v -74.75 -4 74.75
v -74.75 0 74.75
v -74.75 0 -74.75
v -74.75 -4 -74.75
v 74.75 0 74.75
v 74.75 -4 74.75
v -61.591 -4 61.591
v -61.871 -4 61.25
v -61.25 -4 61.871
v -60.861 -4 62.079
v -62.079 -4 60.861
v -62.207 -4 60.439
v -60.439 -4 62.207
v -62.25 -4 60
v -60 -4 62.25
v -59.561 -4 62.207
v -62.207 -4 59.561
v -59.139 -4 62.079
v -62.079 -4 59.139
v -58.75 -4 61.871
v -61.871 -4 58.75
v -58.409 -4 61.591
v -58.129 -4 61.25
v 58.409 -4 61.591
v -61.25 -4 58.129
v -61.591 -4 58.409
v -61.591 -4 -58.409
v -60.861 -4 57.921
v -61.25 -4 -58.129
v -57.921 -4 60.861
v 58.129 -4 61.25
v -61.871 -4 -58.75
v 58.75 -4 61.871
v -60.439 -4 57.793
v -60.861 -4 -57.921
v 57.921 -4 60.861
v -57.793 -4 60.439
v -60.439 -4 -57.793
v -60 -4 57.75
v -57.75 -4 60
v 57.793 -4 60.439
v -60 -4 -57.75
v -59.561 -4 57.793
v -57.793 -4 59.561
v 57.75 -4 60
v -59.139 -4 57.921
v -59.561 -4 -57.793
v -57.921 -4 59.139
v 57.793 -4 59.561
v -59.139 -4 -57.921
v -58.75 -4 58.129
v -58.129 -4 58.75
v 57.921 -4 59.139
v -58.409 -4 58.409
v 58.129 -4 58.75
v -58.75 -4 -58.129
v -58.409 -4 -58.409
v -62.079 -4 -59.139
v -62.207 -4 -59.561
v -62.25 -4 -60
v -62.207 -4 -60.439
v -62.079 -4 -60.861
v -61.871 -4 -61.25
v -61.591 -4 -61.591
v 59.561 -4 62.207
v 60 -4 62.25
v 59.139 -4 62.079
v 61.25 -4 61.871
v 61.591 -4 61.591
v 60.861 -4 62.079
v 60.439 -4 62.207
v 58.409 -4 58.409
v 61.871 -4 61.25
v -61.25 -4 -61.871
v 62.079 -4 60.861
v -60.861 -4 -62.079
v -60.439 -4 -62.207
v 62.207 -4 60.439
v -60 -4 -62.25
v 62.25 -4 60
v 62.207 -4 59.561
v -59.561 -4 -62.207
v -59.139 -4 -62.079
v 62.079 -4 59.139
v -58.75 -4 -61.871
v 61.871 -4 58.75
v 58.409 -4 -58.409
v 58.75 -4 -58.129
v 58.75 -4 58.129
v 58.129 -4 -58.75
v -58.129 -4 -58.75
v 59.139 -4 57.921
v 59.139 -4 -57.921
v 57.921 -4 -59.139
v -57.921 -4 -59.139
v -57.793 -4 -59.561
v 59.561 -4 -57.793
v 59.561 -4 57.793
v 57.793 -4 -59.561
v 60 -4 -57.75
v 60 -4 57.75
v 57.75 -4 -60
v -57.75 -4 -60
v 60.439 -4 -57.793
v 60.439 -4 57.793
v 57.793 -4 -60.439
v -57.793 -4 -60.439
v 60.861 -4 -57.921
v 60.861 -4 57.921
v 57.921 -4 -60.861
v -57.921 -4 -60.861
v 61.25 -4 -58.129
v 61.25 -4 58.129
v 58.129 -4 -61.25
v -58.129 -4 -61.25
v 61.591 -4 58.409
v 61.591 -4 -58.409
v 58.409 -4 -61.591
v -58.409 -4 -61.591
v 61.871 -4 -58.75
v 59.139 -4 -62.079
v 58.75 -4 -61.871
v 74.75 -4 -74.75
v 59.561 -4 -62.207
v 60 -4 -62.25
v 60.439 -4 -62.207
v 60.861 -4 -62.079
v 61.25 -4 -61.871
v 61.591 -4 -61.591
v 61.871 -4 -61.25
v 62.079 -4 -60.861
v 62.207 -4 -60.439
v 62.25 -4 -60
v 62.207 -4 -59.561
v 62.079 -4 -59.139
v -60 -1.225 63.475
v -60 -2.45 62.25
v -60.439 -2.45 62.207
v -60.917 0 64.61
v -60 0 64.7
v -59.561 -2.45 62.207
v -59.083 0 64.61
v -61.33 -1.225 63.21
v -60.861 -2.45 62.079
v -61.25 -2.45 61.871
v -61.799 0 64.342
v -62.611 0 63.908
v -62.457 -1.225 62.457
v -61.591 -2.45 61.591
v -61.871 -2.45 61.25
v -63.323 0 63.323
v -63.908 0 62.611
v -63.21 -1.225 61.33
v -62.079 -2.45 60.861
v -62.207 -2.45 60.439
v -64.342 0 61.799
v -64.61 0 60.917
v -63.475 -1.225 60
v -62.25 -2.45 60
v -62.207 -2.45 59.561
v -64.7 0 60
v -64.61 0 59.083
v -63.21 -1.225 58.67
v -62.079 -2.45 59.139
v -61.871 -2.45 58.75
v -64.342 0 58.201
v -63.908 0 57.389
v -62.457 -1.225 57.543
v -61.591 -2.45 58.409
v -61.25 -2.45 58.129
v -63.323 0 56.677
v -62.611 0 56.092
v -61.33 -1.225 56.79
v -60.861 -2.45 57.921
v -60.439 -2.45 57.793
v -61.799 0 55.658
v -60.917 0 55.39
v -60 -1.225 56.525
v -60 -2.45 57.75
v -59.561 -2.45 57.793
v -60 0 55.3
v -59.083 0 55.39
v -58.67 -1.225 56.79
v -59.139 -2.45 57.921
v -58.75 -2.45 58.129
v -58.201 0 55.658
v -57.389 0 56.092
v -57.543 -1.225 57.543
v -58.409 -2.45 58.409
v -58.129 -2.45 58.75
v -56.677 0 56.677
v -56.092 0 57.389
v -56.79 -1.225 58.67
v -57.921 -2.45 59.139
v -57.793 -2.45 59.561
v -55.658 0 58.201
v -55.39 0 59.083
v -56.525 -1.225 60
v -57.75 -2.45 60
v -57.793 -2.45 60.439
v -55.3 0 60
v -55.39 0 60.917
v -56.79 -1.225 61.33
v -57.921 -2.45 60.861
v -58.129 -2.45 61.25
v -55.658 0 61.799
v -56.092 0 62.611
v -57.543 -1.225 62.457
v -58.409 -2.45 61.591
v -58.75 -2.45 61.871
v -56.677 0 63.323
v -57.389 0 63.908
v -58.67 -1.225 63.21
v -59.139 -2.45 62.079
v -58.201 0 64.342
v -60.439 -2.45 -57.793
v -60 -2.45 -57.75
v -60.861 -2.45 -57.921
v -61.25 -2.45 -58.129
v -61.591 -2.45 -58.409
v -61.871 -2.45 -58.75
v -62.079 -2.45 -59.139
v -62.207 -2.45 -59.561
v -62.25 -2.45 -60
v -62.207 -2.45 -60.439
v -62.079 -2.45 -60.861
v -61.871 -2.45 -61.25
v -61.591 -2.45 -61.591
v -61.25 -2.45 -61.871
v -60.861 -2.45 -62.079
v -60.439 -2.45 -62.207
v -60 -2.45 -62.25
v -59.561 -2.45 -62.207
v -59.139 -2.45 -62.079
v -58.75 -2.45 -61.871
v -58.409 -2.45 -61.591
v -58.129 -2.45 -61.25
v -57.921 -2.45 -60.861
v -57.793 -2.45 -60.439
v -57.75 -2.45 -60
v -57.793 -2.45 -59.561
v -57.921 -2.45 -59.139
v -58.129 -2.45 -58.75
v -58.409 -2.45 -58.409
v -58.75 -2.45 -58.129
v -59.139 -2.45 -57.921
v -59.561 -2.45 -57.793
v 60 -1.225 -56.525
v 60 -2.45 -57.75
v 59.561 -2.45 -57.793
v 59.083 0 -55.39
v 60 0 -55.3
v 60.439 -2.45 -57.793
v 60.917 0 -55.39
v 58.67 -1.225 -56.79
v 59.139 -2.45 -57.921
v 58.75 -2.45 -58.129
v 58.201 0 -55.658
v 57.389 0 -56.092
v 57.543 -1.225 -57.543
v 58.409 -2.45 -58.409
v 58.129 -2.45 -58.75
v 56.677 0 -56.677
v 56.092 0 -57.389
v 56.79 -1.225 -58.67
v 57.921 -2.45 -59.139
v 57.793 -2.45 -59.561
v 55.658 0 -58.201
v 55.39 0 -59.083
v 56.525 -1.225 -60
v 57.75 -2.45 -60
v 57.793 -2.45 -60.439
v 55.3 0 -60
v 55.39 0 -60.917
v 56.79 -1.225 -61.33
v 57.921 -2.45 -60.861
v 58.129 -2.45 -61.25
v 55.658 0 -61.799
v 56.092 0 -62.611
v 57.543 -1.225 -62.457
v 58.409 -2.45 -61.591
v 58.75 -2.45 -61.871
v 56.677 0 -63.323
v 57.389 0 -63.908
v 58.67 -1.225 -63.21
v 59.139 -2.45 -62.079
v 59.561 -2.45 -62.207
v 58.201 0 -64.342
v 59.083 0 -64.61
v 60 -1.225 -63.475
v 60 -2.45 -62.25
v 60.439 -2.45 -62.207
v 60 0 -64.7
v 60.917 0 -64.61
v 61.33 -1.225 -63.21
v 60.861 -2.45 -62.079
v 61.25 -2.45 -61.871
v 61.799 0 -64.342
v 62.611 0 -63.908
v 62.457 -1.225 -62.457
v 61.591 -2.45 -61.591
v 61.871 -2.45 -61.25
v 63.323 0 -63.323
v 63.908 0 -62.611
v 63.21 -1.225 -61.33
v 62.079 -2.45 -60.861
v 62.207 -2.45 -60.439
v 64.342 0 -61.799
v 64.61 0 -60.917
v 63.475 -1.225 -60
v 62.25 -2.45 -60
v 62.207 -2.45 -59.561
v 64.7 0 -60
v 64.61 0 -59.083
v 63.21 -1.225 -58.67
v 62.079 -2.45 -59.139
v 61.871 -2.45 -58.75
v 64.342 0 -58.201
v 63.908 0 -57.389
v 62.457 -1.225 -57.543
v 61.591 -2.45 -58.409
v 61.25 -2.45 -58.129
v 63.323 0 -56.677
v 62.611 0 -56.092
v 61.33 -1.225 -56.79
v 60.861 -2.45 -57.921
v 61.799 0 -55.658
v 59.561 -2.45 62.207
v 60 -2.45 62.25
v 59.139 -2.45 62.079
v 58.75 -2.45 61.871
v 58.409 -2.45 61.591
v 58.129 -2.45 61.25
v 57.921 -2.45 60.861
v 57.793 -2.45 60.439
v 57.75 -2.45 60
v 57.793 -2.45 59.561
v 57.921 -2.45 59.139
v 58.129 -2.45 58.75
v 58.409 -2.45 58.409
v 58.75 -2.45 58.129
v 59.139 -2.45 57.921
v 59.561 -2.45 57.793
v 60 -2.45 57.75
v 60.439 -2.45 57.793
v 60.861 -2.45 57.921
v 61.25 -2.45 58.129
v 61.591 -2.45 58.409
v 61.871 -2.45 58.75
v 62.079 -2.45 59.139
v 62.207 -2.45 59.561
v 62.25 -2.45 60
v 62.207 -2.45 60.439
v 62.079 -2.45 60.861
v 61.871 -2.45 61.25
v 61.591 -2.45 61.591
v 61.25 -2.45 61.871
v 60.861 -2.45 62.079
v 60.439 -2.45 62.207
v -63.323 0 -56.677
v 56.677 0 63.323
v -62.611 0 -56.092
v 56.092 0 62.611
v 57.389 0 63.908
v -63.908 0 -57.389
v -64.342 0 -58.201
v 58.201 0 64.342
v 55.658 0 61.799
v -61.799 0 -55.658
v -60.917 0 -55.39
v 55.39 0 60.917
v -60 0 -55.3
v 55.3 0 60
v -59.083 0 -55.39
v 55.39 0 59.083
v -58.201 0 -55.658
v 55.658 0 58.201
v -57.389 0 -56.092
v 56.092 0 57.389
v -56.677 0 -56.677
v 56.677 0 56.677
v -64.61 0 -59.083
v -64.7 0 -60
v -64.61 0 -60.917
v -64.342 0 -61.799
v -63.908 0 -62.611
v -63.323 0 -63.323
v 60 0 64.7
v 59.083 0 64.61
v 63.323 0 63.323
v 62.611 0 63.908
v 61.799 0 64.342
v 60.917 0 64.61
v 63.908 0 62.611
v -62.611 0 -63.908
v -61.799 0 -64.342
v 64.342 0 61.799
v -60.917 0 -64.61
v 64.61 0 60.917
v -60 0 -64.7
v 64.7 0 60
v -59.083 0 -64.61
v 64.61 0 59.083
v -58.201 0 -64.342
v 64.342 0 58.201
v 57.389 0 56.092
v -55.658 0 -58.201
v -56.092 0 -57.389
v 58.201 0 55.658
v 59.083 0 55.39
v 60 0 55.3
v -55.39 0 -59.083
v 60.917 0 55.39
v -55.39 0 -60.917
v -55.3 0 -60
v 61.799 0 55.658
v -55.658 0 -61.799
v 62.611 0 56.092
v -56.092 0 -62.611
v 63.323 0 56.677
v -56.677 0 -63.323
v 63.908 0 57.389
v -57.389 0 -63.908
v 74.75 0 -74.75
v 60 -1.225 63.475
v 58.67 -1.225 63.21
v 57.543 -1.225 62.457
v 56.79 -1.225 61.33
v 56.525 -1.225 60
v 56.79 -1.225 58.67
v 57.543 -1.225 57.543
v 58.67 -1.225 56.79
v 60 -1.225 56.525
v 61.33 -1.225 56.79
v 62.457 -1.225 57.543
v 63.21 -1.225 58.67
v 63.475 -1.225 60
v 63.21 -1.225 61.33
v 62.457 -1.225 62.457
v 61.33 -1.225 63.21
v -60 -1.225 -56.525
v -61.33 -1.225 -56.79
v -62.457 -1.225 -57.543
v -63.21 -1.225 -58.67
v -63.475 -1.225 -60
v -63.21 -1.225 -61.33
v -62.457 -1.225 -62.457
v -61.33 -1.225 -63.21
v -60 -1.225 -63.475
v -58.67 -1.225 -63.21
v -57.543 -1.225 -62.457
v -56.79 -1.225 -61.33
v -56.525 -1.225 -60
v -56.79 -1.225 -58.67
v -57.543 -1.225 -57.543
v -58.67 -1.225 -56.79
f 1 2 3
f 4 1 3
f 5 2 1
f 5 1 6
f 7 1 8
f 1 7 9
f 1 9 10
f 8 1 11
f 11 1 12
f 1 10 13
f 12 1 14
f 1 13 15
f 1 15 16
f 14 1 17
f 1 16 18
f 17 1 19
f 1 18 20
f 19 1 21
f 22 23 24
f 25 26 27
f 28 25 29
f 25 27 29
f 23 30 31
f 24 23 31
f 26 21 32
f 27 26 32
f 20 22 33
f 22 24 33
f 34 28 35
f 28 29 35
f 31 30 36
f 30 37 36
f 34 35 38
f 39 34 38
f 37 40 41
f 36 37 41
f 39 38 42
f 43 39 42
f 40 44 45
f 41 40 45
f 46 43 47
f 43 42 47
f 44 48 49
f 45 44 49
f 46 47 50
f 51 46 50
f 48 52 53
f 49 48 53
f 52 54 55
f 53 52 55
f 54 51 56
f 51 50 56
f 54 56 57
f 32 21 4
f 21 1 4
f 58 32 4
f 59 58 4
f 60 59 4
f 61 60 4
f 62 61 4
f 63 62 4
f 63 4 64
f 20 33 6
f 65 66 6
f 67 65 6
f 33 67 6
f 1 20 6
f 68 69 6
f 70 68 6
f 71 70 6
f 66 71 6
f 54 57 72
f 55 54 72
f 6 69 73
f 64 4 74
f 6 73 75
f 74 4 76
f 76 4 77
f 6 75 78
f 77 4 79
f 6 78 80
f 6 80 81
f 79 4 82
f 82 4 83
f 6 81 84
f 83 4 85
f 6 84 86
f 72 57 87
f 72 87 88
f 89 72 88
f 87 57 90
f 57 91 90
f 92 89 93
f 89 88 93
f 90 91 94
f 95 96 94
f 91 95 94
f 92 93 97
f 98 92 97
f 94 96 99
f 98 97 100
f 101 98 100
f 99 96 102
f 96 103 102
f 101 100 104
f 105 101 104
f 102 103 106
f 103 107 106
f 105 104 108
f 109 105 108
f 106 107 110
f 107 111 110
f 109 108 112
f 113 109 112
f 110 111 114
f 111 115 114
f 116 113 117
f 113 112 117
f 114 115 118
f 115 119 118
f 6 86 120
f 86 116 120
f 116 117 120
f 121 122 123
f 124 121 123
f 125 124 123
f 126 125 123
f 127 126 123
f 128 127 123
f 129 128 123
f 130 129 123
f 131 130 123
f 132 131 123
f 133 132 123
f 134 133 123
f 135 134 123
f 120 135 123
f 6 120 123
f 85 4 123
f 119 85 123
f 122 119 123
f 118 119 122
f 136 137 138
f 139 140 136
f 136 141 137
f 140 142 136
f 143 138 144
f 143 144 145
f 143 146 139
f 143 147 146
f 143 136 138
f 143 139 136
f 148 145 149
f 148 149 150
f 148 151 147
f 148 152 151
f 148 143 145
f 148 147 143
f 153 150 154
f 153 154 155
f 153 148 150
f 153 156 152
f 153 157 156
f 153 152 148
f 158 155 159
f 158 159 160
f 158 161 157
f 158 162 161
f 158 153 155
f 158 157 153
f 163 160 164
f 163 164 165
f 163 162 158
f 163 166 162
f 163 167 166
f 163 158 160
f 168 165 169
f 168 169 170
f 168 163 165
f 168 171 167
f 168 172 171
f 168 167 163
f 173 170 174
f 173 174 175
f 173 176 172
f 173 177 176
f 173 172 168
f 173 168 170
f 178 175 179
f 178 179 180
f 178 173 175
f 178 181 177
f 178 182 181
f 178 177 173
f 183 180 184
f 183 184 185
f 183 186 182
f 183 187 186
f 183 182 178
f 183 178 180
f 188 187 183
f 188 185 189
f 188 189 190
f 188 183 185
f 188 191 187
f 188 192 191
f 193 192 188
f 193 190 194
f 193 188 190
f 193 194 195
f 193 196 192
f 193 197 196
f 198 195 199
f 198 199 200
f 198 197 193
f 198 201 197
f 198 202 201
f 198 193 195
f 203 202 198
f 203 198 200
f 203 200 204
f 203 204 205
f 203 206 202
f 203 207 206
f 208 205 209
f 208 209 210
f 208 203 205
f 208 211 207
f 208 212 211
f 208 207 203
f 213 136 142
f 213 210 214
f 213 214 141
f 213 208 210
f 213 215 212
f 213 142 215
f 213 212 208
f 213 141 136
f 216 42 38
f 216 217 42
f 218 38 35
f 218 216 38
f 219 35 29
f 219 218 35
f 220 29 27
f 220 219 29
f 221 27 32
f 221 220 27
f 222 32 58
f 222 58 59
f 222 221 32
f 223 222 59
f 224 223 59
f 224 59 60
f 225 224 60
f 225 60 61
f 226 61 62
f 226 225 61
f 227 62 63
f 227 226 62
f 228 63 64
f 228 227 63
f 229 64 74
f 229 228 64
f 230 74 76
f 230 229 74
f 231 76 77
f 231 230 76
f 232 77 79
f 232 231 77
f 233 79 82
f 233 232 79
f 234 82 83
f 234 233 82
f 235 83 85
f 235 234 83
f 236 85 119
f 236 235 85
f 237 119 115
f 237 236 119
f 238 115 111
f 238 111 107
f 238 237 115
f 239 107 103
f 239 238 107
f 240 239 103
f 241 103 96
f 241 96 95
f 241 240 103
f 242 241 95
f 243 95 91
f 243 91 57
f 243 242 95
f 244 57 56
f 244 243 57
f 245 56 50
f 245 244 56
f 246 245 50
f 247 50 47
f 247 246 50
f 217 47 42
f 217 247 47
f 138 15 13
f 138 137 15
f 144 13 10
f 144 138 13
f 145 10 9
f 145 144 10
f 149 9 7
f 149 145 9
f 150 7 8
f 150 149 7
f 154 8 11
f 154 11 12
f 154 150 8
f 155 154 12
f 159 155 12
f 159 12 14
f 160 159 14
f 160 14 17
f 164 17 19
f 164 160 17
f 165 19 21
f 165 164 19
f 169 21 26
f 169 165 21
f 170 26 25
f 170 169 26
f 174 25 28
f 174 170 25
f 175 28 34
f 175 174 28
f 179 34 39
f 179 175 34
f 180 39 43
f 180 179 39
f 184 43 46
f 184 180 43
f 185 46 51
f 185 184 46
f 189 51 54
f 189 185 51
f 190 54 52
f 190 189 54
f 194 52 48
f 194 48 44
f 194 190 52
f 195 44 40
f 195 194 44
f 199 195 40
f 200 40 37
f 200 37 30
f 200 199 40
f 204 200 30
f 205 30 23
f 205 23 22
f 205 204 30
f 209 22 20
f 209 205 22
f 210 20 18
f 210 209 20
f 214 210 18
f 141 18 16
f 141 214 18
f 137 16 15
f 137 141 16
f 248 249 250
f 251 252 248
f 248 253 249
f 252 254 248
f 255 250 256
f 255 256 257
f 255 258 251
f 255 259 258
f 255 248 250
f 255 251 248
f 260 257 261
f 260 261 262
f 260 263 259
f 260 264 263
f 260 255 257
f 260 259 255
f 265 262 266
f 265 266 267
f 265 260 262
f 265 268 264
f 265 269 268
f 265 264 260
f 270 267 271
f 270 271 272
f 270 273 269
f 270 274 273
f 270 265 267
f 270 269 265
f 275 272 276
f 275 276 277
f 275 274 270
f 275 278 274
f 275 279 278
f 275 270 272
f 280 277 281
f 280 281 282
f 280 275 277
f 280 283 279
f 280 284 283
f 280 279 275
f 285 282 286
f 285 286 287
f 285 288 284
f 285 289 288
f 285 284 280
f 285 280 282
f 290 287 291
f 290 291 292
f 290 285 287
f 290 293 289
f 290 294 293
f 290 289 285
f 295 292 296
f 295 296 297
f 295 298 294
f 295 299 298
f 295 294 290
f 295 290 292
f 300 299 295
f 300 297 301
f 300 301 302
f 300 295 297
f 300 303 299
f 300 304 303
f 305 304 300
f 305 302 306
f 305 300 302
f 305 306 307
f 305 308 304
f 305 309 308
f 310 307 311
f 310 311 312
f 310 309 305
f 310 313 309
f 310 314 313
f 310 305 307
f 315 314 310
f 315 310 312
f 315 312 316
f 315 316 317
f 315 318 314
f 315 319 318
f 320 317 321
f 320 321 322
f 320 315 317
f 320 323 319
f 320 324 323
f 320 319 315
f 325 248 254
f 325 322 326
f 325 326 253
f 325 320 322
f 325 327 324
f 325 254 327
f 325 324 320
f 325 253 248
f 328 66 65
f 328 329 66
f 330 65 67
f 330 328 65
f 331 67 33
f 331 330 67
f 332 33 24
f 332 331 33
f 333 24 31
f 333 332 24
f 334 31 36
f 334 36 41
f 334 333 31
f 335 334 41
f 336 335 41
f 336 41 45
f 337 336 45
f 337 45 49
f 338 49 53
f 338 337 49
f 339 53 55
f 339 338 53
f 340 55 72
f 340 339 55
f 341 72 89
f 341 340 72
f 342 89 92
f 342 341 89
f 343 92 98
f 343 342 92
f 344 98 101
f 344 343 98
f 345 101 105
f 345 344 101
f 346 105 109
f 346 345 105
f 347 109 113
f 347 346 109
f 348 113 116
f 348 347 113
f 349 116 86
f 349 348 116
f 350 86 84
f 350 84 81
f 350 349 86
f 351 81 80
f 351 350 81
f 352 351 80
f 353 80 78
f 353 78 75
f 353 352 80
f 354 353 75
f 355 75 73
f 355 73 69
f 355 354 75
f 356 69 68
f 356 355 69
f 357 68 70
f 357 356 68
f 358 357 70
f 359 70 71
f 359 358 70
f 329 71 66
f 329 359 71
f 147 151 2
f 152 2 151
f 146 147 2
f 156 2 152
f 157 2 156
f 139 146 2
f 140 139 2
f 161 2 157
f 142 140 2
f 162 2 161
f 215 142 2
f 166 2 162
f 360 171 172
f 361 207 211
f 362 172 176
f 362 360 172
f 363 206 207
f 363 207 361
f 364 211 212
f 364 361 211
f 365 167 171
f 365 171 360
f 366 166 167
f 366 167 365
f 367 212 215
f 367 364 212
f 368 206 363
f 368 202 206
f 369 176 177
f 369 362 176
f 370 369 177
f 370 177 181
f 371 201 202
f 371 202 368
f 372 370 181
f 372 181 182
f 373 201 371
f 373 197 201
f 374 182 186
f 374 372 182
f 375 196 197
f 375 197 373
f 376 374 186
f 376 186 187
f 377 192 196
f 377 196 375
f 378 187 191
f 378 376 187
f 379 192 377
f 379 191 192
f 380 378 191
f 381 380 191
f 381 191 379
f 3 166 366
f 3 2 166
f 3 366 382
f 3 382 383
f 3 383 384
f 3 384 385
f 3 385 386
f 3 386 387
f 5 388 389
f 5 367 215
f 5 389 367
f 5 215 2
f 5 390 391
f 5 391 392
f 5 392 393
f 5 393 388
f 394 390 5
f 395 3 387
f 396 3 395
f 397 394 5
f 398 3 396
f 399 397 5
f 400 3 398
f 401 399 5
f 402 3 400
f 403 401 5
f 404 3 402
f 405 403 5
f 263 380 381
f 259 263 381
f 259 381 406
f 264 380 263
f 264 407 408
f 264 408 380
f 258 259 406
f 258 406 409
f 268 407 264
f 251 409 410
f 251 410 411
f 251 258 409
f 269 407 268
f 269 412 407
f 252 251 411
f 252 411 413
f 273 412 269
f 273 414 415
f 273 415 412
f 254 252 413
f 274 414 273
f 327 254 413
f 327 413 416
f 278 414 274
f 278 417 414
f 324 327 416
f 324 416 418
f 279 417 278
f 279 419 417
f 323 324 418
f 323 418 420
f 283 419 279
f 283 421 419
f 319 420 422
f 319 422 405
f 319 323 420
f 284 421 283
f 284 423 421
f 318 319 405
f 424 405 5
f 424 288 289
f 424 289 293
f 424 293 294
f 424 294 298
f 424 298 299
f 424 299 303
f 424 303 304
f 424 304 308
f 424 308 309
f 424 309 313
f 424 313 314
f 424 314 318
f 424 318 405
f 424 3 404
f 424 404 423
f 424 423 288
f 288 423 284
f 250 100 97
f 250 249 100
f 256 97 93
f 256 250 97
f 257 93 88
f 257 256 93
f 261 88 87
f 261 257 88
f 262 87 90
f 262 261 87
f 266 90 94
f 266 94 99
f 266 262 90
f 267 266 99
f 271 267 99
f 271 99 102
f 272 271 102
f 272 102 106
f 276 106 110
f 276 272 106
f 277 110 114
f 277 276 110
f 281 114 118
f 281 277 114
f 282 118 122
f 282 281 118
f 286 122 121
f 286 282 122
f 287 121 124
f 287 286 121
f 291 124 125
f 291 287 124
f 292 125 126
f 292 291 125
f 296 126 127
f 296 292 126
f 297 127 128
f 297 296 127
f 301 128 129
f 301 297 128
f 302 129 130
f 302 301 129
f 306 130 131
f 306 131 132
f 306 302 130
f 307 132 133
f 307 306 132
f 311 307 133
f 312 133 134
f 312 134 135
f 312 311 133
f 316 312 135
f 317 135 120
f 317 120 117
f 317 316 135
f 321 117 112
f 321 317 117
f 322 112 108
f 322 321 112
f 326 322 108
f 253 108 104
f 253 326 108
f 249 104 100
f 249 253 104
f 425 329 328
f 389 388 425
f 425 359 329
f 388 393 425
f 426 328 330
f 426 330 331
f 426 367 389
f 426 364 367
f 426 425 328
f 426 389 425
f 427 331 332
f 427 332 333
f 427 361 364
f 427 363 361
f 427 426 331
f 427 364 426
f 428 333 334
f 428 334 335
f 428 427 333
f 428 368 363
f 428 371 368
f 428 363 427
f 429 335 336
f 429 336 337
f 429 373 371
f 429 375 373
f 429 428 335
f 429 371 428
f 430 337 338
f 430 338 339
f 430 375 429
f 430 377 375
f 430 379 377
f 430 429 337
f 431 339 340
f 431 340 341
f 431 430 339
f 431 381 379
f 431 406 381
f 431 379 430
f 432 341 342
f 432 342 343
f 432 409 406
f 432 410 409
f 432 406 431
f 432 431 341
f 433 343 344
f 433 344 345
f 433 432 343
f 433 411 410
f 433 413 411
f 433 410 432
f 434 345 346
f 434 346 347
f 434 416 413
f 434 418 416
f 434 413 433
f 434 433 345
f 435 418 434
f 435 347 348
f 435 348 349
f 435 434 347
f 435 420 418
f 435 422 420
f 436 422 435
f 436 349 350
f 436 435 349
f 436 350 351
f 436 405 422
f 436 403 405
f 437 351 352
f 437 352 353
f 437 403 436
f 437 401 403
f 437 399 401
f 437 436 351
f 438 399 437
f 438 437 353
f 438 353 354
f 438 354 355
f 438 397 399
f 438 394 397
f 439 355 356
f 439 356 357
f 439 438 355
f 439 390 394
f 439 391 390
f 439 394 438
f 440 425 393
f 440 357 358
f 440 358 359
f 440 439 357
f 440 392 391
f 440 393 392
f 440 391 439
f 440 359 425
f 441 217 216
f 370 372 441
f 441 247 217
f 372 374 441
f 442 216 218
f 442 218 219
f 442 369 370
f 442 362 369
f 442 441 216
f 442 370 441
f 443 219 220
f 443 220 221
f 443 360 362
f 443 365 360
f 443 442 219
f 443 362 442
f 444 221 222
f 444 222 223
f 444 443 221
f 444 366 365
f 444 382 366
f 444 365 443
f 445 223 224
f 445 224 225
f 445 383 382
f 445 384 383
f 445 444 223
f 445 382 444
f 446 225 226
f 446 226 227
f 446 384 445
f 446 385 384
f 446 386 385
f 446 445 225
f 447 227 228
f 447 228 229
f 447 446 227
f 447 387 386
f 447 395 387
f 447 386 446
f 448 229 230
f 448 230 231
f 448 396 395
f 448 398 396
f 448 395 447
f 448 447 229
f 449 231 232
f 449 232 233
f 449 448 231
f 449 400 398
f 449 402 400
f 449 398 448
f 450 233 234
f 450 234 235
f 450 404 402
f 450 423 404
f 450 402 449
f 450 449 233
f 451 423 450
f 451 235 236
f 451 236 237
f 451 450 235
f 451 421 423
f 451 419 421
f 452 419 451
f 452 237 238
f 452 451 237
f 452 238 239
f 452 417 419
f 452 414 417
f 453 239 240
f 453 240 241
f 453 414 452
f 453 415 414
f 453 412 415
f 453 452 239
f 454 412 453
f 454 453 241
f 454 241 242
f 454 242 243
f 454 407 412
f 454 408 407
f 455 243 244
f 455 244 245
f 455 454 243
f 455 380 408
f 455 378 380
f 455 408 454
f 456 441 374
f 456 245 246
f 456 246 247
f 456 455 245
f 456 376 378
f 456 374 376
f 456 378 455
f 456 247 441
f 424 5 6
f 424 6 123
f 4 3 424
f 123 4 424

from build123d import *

# Parameters (mm, degrees)
SKETCH1_W                                      = 149.5
SKETCH1_H                                      = 149.5
BASE_FLANGE1_DEPTH                             = 4
CSK_FOR_M4_FLAT_HEAD_MACHINE_SCREW1_AT_2_COUNT = 2
CSK_FOR_M4_FLAT_HEAD_MACHINE_SCREW1_AT_2_PITCH = 120
CSK_FOR_M4_FLAT_HEAD_MACHINE_SCREW1_AT_3_COUNT = 2
CSK_FOR_M4_FLAT_HEAD_MACHINE_SCREW1_AT_3_PITCH = 169.705627485
CSK_FOR_M4_FLAT_HEAD_MACHINE_SCREW1_AT_4_COUNT = 2
CSK_FOR_M4_FLAT_HEAD_MACHINE_SCREW1_AT_4_PITCH = 120


# Sheet-metal steps are written as plain solids
with BuildPart() as part:
    # Sketch1 → Base-Flange1 (new body)
    with BuildSketch(Plane(origin=(0, 0, 0), x_dir=(1, 0, 0), z_dir=(0, 1, 0))):
        Rectangle(SKETCH1_W, SKETCH1_H)
    extrude(amount=-BASE_FLANGE1_DEPTH)

    # Sketch5 → CSK for M4 Flat Head Machine Screw1 (revolve, cut)
    with BuildSketch(Plane(origin=(60, 0, -60), x_dir=(0, 0, 1), z_dir=(1, 0, 0))):
        Polygon((0, 0), (0, 4), (2.25, 4), (2.25, 2.45), (4.7, 0), align=None)
    csk_for_m4_flat_head_machine_screw1 = revolve(axis=Axis((60, 6.35, -60), (0, -1, 0)), mode=Mode.SUBTRACT)

    # CSK for M4 Flat Head Machine Screw1 at 2: CSK for M4 Flat Head Machine Screw1 ×2
    with Locations(*[(-i * CSK_FOR_M4_FLAT_HEAD_MACHINE_SCREW1_AT_2_PITCH, 0, 0) for i in range(1, CSK_FOR_M4_FLAT_HEAD_MACHINE_SCREW1_AT_2_COUNT)]):
        add(csk_for_m4_flat_head_machine_screw1, mode=Mode.SUBTRACT)

    # CSK for M4 Flat Head Machine Screw1 at 3: CSK for M4 Flat Head Machine Screw1 ×2
    with Locations(*[Vector(-0.7071067811865475, 0, 0.7071067811865476) * (i * CSK_FOR_M4_FLAT_HEAD_MACHINE_SCREW1_AT_3_PITCH) for i in range(1, CSK_FOR_M4_FLAT_HEAD_MACHINE_SCREW1_AT_3_COUNT)]):
        add(csk_for_m4_flat_head_machine_screw1, mode=Mode.SUBTRACT)

    # CSK for M4 Flat Head Machine Screw1 at 4: CSK for M4 Flat Head Machine Screw1 ×2
    with Locations(*[(0, 0, i * CSK_FOR_M4_FLAT_HEAD_MACHINE_SCREW1_AT_4_PITCH) for i in range(1, CSK_FOR_M4_FLAT_HEAD_MACHINE_SCREW1_AT_4_COUNT)]):
        add(csk_for_m4_flat_head_machine_screw1, mode=Mode.SUBTRACT)


solid = part.part
